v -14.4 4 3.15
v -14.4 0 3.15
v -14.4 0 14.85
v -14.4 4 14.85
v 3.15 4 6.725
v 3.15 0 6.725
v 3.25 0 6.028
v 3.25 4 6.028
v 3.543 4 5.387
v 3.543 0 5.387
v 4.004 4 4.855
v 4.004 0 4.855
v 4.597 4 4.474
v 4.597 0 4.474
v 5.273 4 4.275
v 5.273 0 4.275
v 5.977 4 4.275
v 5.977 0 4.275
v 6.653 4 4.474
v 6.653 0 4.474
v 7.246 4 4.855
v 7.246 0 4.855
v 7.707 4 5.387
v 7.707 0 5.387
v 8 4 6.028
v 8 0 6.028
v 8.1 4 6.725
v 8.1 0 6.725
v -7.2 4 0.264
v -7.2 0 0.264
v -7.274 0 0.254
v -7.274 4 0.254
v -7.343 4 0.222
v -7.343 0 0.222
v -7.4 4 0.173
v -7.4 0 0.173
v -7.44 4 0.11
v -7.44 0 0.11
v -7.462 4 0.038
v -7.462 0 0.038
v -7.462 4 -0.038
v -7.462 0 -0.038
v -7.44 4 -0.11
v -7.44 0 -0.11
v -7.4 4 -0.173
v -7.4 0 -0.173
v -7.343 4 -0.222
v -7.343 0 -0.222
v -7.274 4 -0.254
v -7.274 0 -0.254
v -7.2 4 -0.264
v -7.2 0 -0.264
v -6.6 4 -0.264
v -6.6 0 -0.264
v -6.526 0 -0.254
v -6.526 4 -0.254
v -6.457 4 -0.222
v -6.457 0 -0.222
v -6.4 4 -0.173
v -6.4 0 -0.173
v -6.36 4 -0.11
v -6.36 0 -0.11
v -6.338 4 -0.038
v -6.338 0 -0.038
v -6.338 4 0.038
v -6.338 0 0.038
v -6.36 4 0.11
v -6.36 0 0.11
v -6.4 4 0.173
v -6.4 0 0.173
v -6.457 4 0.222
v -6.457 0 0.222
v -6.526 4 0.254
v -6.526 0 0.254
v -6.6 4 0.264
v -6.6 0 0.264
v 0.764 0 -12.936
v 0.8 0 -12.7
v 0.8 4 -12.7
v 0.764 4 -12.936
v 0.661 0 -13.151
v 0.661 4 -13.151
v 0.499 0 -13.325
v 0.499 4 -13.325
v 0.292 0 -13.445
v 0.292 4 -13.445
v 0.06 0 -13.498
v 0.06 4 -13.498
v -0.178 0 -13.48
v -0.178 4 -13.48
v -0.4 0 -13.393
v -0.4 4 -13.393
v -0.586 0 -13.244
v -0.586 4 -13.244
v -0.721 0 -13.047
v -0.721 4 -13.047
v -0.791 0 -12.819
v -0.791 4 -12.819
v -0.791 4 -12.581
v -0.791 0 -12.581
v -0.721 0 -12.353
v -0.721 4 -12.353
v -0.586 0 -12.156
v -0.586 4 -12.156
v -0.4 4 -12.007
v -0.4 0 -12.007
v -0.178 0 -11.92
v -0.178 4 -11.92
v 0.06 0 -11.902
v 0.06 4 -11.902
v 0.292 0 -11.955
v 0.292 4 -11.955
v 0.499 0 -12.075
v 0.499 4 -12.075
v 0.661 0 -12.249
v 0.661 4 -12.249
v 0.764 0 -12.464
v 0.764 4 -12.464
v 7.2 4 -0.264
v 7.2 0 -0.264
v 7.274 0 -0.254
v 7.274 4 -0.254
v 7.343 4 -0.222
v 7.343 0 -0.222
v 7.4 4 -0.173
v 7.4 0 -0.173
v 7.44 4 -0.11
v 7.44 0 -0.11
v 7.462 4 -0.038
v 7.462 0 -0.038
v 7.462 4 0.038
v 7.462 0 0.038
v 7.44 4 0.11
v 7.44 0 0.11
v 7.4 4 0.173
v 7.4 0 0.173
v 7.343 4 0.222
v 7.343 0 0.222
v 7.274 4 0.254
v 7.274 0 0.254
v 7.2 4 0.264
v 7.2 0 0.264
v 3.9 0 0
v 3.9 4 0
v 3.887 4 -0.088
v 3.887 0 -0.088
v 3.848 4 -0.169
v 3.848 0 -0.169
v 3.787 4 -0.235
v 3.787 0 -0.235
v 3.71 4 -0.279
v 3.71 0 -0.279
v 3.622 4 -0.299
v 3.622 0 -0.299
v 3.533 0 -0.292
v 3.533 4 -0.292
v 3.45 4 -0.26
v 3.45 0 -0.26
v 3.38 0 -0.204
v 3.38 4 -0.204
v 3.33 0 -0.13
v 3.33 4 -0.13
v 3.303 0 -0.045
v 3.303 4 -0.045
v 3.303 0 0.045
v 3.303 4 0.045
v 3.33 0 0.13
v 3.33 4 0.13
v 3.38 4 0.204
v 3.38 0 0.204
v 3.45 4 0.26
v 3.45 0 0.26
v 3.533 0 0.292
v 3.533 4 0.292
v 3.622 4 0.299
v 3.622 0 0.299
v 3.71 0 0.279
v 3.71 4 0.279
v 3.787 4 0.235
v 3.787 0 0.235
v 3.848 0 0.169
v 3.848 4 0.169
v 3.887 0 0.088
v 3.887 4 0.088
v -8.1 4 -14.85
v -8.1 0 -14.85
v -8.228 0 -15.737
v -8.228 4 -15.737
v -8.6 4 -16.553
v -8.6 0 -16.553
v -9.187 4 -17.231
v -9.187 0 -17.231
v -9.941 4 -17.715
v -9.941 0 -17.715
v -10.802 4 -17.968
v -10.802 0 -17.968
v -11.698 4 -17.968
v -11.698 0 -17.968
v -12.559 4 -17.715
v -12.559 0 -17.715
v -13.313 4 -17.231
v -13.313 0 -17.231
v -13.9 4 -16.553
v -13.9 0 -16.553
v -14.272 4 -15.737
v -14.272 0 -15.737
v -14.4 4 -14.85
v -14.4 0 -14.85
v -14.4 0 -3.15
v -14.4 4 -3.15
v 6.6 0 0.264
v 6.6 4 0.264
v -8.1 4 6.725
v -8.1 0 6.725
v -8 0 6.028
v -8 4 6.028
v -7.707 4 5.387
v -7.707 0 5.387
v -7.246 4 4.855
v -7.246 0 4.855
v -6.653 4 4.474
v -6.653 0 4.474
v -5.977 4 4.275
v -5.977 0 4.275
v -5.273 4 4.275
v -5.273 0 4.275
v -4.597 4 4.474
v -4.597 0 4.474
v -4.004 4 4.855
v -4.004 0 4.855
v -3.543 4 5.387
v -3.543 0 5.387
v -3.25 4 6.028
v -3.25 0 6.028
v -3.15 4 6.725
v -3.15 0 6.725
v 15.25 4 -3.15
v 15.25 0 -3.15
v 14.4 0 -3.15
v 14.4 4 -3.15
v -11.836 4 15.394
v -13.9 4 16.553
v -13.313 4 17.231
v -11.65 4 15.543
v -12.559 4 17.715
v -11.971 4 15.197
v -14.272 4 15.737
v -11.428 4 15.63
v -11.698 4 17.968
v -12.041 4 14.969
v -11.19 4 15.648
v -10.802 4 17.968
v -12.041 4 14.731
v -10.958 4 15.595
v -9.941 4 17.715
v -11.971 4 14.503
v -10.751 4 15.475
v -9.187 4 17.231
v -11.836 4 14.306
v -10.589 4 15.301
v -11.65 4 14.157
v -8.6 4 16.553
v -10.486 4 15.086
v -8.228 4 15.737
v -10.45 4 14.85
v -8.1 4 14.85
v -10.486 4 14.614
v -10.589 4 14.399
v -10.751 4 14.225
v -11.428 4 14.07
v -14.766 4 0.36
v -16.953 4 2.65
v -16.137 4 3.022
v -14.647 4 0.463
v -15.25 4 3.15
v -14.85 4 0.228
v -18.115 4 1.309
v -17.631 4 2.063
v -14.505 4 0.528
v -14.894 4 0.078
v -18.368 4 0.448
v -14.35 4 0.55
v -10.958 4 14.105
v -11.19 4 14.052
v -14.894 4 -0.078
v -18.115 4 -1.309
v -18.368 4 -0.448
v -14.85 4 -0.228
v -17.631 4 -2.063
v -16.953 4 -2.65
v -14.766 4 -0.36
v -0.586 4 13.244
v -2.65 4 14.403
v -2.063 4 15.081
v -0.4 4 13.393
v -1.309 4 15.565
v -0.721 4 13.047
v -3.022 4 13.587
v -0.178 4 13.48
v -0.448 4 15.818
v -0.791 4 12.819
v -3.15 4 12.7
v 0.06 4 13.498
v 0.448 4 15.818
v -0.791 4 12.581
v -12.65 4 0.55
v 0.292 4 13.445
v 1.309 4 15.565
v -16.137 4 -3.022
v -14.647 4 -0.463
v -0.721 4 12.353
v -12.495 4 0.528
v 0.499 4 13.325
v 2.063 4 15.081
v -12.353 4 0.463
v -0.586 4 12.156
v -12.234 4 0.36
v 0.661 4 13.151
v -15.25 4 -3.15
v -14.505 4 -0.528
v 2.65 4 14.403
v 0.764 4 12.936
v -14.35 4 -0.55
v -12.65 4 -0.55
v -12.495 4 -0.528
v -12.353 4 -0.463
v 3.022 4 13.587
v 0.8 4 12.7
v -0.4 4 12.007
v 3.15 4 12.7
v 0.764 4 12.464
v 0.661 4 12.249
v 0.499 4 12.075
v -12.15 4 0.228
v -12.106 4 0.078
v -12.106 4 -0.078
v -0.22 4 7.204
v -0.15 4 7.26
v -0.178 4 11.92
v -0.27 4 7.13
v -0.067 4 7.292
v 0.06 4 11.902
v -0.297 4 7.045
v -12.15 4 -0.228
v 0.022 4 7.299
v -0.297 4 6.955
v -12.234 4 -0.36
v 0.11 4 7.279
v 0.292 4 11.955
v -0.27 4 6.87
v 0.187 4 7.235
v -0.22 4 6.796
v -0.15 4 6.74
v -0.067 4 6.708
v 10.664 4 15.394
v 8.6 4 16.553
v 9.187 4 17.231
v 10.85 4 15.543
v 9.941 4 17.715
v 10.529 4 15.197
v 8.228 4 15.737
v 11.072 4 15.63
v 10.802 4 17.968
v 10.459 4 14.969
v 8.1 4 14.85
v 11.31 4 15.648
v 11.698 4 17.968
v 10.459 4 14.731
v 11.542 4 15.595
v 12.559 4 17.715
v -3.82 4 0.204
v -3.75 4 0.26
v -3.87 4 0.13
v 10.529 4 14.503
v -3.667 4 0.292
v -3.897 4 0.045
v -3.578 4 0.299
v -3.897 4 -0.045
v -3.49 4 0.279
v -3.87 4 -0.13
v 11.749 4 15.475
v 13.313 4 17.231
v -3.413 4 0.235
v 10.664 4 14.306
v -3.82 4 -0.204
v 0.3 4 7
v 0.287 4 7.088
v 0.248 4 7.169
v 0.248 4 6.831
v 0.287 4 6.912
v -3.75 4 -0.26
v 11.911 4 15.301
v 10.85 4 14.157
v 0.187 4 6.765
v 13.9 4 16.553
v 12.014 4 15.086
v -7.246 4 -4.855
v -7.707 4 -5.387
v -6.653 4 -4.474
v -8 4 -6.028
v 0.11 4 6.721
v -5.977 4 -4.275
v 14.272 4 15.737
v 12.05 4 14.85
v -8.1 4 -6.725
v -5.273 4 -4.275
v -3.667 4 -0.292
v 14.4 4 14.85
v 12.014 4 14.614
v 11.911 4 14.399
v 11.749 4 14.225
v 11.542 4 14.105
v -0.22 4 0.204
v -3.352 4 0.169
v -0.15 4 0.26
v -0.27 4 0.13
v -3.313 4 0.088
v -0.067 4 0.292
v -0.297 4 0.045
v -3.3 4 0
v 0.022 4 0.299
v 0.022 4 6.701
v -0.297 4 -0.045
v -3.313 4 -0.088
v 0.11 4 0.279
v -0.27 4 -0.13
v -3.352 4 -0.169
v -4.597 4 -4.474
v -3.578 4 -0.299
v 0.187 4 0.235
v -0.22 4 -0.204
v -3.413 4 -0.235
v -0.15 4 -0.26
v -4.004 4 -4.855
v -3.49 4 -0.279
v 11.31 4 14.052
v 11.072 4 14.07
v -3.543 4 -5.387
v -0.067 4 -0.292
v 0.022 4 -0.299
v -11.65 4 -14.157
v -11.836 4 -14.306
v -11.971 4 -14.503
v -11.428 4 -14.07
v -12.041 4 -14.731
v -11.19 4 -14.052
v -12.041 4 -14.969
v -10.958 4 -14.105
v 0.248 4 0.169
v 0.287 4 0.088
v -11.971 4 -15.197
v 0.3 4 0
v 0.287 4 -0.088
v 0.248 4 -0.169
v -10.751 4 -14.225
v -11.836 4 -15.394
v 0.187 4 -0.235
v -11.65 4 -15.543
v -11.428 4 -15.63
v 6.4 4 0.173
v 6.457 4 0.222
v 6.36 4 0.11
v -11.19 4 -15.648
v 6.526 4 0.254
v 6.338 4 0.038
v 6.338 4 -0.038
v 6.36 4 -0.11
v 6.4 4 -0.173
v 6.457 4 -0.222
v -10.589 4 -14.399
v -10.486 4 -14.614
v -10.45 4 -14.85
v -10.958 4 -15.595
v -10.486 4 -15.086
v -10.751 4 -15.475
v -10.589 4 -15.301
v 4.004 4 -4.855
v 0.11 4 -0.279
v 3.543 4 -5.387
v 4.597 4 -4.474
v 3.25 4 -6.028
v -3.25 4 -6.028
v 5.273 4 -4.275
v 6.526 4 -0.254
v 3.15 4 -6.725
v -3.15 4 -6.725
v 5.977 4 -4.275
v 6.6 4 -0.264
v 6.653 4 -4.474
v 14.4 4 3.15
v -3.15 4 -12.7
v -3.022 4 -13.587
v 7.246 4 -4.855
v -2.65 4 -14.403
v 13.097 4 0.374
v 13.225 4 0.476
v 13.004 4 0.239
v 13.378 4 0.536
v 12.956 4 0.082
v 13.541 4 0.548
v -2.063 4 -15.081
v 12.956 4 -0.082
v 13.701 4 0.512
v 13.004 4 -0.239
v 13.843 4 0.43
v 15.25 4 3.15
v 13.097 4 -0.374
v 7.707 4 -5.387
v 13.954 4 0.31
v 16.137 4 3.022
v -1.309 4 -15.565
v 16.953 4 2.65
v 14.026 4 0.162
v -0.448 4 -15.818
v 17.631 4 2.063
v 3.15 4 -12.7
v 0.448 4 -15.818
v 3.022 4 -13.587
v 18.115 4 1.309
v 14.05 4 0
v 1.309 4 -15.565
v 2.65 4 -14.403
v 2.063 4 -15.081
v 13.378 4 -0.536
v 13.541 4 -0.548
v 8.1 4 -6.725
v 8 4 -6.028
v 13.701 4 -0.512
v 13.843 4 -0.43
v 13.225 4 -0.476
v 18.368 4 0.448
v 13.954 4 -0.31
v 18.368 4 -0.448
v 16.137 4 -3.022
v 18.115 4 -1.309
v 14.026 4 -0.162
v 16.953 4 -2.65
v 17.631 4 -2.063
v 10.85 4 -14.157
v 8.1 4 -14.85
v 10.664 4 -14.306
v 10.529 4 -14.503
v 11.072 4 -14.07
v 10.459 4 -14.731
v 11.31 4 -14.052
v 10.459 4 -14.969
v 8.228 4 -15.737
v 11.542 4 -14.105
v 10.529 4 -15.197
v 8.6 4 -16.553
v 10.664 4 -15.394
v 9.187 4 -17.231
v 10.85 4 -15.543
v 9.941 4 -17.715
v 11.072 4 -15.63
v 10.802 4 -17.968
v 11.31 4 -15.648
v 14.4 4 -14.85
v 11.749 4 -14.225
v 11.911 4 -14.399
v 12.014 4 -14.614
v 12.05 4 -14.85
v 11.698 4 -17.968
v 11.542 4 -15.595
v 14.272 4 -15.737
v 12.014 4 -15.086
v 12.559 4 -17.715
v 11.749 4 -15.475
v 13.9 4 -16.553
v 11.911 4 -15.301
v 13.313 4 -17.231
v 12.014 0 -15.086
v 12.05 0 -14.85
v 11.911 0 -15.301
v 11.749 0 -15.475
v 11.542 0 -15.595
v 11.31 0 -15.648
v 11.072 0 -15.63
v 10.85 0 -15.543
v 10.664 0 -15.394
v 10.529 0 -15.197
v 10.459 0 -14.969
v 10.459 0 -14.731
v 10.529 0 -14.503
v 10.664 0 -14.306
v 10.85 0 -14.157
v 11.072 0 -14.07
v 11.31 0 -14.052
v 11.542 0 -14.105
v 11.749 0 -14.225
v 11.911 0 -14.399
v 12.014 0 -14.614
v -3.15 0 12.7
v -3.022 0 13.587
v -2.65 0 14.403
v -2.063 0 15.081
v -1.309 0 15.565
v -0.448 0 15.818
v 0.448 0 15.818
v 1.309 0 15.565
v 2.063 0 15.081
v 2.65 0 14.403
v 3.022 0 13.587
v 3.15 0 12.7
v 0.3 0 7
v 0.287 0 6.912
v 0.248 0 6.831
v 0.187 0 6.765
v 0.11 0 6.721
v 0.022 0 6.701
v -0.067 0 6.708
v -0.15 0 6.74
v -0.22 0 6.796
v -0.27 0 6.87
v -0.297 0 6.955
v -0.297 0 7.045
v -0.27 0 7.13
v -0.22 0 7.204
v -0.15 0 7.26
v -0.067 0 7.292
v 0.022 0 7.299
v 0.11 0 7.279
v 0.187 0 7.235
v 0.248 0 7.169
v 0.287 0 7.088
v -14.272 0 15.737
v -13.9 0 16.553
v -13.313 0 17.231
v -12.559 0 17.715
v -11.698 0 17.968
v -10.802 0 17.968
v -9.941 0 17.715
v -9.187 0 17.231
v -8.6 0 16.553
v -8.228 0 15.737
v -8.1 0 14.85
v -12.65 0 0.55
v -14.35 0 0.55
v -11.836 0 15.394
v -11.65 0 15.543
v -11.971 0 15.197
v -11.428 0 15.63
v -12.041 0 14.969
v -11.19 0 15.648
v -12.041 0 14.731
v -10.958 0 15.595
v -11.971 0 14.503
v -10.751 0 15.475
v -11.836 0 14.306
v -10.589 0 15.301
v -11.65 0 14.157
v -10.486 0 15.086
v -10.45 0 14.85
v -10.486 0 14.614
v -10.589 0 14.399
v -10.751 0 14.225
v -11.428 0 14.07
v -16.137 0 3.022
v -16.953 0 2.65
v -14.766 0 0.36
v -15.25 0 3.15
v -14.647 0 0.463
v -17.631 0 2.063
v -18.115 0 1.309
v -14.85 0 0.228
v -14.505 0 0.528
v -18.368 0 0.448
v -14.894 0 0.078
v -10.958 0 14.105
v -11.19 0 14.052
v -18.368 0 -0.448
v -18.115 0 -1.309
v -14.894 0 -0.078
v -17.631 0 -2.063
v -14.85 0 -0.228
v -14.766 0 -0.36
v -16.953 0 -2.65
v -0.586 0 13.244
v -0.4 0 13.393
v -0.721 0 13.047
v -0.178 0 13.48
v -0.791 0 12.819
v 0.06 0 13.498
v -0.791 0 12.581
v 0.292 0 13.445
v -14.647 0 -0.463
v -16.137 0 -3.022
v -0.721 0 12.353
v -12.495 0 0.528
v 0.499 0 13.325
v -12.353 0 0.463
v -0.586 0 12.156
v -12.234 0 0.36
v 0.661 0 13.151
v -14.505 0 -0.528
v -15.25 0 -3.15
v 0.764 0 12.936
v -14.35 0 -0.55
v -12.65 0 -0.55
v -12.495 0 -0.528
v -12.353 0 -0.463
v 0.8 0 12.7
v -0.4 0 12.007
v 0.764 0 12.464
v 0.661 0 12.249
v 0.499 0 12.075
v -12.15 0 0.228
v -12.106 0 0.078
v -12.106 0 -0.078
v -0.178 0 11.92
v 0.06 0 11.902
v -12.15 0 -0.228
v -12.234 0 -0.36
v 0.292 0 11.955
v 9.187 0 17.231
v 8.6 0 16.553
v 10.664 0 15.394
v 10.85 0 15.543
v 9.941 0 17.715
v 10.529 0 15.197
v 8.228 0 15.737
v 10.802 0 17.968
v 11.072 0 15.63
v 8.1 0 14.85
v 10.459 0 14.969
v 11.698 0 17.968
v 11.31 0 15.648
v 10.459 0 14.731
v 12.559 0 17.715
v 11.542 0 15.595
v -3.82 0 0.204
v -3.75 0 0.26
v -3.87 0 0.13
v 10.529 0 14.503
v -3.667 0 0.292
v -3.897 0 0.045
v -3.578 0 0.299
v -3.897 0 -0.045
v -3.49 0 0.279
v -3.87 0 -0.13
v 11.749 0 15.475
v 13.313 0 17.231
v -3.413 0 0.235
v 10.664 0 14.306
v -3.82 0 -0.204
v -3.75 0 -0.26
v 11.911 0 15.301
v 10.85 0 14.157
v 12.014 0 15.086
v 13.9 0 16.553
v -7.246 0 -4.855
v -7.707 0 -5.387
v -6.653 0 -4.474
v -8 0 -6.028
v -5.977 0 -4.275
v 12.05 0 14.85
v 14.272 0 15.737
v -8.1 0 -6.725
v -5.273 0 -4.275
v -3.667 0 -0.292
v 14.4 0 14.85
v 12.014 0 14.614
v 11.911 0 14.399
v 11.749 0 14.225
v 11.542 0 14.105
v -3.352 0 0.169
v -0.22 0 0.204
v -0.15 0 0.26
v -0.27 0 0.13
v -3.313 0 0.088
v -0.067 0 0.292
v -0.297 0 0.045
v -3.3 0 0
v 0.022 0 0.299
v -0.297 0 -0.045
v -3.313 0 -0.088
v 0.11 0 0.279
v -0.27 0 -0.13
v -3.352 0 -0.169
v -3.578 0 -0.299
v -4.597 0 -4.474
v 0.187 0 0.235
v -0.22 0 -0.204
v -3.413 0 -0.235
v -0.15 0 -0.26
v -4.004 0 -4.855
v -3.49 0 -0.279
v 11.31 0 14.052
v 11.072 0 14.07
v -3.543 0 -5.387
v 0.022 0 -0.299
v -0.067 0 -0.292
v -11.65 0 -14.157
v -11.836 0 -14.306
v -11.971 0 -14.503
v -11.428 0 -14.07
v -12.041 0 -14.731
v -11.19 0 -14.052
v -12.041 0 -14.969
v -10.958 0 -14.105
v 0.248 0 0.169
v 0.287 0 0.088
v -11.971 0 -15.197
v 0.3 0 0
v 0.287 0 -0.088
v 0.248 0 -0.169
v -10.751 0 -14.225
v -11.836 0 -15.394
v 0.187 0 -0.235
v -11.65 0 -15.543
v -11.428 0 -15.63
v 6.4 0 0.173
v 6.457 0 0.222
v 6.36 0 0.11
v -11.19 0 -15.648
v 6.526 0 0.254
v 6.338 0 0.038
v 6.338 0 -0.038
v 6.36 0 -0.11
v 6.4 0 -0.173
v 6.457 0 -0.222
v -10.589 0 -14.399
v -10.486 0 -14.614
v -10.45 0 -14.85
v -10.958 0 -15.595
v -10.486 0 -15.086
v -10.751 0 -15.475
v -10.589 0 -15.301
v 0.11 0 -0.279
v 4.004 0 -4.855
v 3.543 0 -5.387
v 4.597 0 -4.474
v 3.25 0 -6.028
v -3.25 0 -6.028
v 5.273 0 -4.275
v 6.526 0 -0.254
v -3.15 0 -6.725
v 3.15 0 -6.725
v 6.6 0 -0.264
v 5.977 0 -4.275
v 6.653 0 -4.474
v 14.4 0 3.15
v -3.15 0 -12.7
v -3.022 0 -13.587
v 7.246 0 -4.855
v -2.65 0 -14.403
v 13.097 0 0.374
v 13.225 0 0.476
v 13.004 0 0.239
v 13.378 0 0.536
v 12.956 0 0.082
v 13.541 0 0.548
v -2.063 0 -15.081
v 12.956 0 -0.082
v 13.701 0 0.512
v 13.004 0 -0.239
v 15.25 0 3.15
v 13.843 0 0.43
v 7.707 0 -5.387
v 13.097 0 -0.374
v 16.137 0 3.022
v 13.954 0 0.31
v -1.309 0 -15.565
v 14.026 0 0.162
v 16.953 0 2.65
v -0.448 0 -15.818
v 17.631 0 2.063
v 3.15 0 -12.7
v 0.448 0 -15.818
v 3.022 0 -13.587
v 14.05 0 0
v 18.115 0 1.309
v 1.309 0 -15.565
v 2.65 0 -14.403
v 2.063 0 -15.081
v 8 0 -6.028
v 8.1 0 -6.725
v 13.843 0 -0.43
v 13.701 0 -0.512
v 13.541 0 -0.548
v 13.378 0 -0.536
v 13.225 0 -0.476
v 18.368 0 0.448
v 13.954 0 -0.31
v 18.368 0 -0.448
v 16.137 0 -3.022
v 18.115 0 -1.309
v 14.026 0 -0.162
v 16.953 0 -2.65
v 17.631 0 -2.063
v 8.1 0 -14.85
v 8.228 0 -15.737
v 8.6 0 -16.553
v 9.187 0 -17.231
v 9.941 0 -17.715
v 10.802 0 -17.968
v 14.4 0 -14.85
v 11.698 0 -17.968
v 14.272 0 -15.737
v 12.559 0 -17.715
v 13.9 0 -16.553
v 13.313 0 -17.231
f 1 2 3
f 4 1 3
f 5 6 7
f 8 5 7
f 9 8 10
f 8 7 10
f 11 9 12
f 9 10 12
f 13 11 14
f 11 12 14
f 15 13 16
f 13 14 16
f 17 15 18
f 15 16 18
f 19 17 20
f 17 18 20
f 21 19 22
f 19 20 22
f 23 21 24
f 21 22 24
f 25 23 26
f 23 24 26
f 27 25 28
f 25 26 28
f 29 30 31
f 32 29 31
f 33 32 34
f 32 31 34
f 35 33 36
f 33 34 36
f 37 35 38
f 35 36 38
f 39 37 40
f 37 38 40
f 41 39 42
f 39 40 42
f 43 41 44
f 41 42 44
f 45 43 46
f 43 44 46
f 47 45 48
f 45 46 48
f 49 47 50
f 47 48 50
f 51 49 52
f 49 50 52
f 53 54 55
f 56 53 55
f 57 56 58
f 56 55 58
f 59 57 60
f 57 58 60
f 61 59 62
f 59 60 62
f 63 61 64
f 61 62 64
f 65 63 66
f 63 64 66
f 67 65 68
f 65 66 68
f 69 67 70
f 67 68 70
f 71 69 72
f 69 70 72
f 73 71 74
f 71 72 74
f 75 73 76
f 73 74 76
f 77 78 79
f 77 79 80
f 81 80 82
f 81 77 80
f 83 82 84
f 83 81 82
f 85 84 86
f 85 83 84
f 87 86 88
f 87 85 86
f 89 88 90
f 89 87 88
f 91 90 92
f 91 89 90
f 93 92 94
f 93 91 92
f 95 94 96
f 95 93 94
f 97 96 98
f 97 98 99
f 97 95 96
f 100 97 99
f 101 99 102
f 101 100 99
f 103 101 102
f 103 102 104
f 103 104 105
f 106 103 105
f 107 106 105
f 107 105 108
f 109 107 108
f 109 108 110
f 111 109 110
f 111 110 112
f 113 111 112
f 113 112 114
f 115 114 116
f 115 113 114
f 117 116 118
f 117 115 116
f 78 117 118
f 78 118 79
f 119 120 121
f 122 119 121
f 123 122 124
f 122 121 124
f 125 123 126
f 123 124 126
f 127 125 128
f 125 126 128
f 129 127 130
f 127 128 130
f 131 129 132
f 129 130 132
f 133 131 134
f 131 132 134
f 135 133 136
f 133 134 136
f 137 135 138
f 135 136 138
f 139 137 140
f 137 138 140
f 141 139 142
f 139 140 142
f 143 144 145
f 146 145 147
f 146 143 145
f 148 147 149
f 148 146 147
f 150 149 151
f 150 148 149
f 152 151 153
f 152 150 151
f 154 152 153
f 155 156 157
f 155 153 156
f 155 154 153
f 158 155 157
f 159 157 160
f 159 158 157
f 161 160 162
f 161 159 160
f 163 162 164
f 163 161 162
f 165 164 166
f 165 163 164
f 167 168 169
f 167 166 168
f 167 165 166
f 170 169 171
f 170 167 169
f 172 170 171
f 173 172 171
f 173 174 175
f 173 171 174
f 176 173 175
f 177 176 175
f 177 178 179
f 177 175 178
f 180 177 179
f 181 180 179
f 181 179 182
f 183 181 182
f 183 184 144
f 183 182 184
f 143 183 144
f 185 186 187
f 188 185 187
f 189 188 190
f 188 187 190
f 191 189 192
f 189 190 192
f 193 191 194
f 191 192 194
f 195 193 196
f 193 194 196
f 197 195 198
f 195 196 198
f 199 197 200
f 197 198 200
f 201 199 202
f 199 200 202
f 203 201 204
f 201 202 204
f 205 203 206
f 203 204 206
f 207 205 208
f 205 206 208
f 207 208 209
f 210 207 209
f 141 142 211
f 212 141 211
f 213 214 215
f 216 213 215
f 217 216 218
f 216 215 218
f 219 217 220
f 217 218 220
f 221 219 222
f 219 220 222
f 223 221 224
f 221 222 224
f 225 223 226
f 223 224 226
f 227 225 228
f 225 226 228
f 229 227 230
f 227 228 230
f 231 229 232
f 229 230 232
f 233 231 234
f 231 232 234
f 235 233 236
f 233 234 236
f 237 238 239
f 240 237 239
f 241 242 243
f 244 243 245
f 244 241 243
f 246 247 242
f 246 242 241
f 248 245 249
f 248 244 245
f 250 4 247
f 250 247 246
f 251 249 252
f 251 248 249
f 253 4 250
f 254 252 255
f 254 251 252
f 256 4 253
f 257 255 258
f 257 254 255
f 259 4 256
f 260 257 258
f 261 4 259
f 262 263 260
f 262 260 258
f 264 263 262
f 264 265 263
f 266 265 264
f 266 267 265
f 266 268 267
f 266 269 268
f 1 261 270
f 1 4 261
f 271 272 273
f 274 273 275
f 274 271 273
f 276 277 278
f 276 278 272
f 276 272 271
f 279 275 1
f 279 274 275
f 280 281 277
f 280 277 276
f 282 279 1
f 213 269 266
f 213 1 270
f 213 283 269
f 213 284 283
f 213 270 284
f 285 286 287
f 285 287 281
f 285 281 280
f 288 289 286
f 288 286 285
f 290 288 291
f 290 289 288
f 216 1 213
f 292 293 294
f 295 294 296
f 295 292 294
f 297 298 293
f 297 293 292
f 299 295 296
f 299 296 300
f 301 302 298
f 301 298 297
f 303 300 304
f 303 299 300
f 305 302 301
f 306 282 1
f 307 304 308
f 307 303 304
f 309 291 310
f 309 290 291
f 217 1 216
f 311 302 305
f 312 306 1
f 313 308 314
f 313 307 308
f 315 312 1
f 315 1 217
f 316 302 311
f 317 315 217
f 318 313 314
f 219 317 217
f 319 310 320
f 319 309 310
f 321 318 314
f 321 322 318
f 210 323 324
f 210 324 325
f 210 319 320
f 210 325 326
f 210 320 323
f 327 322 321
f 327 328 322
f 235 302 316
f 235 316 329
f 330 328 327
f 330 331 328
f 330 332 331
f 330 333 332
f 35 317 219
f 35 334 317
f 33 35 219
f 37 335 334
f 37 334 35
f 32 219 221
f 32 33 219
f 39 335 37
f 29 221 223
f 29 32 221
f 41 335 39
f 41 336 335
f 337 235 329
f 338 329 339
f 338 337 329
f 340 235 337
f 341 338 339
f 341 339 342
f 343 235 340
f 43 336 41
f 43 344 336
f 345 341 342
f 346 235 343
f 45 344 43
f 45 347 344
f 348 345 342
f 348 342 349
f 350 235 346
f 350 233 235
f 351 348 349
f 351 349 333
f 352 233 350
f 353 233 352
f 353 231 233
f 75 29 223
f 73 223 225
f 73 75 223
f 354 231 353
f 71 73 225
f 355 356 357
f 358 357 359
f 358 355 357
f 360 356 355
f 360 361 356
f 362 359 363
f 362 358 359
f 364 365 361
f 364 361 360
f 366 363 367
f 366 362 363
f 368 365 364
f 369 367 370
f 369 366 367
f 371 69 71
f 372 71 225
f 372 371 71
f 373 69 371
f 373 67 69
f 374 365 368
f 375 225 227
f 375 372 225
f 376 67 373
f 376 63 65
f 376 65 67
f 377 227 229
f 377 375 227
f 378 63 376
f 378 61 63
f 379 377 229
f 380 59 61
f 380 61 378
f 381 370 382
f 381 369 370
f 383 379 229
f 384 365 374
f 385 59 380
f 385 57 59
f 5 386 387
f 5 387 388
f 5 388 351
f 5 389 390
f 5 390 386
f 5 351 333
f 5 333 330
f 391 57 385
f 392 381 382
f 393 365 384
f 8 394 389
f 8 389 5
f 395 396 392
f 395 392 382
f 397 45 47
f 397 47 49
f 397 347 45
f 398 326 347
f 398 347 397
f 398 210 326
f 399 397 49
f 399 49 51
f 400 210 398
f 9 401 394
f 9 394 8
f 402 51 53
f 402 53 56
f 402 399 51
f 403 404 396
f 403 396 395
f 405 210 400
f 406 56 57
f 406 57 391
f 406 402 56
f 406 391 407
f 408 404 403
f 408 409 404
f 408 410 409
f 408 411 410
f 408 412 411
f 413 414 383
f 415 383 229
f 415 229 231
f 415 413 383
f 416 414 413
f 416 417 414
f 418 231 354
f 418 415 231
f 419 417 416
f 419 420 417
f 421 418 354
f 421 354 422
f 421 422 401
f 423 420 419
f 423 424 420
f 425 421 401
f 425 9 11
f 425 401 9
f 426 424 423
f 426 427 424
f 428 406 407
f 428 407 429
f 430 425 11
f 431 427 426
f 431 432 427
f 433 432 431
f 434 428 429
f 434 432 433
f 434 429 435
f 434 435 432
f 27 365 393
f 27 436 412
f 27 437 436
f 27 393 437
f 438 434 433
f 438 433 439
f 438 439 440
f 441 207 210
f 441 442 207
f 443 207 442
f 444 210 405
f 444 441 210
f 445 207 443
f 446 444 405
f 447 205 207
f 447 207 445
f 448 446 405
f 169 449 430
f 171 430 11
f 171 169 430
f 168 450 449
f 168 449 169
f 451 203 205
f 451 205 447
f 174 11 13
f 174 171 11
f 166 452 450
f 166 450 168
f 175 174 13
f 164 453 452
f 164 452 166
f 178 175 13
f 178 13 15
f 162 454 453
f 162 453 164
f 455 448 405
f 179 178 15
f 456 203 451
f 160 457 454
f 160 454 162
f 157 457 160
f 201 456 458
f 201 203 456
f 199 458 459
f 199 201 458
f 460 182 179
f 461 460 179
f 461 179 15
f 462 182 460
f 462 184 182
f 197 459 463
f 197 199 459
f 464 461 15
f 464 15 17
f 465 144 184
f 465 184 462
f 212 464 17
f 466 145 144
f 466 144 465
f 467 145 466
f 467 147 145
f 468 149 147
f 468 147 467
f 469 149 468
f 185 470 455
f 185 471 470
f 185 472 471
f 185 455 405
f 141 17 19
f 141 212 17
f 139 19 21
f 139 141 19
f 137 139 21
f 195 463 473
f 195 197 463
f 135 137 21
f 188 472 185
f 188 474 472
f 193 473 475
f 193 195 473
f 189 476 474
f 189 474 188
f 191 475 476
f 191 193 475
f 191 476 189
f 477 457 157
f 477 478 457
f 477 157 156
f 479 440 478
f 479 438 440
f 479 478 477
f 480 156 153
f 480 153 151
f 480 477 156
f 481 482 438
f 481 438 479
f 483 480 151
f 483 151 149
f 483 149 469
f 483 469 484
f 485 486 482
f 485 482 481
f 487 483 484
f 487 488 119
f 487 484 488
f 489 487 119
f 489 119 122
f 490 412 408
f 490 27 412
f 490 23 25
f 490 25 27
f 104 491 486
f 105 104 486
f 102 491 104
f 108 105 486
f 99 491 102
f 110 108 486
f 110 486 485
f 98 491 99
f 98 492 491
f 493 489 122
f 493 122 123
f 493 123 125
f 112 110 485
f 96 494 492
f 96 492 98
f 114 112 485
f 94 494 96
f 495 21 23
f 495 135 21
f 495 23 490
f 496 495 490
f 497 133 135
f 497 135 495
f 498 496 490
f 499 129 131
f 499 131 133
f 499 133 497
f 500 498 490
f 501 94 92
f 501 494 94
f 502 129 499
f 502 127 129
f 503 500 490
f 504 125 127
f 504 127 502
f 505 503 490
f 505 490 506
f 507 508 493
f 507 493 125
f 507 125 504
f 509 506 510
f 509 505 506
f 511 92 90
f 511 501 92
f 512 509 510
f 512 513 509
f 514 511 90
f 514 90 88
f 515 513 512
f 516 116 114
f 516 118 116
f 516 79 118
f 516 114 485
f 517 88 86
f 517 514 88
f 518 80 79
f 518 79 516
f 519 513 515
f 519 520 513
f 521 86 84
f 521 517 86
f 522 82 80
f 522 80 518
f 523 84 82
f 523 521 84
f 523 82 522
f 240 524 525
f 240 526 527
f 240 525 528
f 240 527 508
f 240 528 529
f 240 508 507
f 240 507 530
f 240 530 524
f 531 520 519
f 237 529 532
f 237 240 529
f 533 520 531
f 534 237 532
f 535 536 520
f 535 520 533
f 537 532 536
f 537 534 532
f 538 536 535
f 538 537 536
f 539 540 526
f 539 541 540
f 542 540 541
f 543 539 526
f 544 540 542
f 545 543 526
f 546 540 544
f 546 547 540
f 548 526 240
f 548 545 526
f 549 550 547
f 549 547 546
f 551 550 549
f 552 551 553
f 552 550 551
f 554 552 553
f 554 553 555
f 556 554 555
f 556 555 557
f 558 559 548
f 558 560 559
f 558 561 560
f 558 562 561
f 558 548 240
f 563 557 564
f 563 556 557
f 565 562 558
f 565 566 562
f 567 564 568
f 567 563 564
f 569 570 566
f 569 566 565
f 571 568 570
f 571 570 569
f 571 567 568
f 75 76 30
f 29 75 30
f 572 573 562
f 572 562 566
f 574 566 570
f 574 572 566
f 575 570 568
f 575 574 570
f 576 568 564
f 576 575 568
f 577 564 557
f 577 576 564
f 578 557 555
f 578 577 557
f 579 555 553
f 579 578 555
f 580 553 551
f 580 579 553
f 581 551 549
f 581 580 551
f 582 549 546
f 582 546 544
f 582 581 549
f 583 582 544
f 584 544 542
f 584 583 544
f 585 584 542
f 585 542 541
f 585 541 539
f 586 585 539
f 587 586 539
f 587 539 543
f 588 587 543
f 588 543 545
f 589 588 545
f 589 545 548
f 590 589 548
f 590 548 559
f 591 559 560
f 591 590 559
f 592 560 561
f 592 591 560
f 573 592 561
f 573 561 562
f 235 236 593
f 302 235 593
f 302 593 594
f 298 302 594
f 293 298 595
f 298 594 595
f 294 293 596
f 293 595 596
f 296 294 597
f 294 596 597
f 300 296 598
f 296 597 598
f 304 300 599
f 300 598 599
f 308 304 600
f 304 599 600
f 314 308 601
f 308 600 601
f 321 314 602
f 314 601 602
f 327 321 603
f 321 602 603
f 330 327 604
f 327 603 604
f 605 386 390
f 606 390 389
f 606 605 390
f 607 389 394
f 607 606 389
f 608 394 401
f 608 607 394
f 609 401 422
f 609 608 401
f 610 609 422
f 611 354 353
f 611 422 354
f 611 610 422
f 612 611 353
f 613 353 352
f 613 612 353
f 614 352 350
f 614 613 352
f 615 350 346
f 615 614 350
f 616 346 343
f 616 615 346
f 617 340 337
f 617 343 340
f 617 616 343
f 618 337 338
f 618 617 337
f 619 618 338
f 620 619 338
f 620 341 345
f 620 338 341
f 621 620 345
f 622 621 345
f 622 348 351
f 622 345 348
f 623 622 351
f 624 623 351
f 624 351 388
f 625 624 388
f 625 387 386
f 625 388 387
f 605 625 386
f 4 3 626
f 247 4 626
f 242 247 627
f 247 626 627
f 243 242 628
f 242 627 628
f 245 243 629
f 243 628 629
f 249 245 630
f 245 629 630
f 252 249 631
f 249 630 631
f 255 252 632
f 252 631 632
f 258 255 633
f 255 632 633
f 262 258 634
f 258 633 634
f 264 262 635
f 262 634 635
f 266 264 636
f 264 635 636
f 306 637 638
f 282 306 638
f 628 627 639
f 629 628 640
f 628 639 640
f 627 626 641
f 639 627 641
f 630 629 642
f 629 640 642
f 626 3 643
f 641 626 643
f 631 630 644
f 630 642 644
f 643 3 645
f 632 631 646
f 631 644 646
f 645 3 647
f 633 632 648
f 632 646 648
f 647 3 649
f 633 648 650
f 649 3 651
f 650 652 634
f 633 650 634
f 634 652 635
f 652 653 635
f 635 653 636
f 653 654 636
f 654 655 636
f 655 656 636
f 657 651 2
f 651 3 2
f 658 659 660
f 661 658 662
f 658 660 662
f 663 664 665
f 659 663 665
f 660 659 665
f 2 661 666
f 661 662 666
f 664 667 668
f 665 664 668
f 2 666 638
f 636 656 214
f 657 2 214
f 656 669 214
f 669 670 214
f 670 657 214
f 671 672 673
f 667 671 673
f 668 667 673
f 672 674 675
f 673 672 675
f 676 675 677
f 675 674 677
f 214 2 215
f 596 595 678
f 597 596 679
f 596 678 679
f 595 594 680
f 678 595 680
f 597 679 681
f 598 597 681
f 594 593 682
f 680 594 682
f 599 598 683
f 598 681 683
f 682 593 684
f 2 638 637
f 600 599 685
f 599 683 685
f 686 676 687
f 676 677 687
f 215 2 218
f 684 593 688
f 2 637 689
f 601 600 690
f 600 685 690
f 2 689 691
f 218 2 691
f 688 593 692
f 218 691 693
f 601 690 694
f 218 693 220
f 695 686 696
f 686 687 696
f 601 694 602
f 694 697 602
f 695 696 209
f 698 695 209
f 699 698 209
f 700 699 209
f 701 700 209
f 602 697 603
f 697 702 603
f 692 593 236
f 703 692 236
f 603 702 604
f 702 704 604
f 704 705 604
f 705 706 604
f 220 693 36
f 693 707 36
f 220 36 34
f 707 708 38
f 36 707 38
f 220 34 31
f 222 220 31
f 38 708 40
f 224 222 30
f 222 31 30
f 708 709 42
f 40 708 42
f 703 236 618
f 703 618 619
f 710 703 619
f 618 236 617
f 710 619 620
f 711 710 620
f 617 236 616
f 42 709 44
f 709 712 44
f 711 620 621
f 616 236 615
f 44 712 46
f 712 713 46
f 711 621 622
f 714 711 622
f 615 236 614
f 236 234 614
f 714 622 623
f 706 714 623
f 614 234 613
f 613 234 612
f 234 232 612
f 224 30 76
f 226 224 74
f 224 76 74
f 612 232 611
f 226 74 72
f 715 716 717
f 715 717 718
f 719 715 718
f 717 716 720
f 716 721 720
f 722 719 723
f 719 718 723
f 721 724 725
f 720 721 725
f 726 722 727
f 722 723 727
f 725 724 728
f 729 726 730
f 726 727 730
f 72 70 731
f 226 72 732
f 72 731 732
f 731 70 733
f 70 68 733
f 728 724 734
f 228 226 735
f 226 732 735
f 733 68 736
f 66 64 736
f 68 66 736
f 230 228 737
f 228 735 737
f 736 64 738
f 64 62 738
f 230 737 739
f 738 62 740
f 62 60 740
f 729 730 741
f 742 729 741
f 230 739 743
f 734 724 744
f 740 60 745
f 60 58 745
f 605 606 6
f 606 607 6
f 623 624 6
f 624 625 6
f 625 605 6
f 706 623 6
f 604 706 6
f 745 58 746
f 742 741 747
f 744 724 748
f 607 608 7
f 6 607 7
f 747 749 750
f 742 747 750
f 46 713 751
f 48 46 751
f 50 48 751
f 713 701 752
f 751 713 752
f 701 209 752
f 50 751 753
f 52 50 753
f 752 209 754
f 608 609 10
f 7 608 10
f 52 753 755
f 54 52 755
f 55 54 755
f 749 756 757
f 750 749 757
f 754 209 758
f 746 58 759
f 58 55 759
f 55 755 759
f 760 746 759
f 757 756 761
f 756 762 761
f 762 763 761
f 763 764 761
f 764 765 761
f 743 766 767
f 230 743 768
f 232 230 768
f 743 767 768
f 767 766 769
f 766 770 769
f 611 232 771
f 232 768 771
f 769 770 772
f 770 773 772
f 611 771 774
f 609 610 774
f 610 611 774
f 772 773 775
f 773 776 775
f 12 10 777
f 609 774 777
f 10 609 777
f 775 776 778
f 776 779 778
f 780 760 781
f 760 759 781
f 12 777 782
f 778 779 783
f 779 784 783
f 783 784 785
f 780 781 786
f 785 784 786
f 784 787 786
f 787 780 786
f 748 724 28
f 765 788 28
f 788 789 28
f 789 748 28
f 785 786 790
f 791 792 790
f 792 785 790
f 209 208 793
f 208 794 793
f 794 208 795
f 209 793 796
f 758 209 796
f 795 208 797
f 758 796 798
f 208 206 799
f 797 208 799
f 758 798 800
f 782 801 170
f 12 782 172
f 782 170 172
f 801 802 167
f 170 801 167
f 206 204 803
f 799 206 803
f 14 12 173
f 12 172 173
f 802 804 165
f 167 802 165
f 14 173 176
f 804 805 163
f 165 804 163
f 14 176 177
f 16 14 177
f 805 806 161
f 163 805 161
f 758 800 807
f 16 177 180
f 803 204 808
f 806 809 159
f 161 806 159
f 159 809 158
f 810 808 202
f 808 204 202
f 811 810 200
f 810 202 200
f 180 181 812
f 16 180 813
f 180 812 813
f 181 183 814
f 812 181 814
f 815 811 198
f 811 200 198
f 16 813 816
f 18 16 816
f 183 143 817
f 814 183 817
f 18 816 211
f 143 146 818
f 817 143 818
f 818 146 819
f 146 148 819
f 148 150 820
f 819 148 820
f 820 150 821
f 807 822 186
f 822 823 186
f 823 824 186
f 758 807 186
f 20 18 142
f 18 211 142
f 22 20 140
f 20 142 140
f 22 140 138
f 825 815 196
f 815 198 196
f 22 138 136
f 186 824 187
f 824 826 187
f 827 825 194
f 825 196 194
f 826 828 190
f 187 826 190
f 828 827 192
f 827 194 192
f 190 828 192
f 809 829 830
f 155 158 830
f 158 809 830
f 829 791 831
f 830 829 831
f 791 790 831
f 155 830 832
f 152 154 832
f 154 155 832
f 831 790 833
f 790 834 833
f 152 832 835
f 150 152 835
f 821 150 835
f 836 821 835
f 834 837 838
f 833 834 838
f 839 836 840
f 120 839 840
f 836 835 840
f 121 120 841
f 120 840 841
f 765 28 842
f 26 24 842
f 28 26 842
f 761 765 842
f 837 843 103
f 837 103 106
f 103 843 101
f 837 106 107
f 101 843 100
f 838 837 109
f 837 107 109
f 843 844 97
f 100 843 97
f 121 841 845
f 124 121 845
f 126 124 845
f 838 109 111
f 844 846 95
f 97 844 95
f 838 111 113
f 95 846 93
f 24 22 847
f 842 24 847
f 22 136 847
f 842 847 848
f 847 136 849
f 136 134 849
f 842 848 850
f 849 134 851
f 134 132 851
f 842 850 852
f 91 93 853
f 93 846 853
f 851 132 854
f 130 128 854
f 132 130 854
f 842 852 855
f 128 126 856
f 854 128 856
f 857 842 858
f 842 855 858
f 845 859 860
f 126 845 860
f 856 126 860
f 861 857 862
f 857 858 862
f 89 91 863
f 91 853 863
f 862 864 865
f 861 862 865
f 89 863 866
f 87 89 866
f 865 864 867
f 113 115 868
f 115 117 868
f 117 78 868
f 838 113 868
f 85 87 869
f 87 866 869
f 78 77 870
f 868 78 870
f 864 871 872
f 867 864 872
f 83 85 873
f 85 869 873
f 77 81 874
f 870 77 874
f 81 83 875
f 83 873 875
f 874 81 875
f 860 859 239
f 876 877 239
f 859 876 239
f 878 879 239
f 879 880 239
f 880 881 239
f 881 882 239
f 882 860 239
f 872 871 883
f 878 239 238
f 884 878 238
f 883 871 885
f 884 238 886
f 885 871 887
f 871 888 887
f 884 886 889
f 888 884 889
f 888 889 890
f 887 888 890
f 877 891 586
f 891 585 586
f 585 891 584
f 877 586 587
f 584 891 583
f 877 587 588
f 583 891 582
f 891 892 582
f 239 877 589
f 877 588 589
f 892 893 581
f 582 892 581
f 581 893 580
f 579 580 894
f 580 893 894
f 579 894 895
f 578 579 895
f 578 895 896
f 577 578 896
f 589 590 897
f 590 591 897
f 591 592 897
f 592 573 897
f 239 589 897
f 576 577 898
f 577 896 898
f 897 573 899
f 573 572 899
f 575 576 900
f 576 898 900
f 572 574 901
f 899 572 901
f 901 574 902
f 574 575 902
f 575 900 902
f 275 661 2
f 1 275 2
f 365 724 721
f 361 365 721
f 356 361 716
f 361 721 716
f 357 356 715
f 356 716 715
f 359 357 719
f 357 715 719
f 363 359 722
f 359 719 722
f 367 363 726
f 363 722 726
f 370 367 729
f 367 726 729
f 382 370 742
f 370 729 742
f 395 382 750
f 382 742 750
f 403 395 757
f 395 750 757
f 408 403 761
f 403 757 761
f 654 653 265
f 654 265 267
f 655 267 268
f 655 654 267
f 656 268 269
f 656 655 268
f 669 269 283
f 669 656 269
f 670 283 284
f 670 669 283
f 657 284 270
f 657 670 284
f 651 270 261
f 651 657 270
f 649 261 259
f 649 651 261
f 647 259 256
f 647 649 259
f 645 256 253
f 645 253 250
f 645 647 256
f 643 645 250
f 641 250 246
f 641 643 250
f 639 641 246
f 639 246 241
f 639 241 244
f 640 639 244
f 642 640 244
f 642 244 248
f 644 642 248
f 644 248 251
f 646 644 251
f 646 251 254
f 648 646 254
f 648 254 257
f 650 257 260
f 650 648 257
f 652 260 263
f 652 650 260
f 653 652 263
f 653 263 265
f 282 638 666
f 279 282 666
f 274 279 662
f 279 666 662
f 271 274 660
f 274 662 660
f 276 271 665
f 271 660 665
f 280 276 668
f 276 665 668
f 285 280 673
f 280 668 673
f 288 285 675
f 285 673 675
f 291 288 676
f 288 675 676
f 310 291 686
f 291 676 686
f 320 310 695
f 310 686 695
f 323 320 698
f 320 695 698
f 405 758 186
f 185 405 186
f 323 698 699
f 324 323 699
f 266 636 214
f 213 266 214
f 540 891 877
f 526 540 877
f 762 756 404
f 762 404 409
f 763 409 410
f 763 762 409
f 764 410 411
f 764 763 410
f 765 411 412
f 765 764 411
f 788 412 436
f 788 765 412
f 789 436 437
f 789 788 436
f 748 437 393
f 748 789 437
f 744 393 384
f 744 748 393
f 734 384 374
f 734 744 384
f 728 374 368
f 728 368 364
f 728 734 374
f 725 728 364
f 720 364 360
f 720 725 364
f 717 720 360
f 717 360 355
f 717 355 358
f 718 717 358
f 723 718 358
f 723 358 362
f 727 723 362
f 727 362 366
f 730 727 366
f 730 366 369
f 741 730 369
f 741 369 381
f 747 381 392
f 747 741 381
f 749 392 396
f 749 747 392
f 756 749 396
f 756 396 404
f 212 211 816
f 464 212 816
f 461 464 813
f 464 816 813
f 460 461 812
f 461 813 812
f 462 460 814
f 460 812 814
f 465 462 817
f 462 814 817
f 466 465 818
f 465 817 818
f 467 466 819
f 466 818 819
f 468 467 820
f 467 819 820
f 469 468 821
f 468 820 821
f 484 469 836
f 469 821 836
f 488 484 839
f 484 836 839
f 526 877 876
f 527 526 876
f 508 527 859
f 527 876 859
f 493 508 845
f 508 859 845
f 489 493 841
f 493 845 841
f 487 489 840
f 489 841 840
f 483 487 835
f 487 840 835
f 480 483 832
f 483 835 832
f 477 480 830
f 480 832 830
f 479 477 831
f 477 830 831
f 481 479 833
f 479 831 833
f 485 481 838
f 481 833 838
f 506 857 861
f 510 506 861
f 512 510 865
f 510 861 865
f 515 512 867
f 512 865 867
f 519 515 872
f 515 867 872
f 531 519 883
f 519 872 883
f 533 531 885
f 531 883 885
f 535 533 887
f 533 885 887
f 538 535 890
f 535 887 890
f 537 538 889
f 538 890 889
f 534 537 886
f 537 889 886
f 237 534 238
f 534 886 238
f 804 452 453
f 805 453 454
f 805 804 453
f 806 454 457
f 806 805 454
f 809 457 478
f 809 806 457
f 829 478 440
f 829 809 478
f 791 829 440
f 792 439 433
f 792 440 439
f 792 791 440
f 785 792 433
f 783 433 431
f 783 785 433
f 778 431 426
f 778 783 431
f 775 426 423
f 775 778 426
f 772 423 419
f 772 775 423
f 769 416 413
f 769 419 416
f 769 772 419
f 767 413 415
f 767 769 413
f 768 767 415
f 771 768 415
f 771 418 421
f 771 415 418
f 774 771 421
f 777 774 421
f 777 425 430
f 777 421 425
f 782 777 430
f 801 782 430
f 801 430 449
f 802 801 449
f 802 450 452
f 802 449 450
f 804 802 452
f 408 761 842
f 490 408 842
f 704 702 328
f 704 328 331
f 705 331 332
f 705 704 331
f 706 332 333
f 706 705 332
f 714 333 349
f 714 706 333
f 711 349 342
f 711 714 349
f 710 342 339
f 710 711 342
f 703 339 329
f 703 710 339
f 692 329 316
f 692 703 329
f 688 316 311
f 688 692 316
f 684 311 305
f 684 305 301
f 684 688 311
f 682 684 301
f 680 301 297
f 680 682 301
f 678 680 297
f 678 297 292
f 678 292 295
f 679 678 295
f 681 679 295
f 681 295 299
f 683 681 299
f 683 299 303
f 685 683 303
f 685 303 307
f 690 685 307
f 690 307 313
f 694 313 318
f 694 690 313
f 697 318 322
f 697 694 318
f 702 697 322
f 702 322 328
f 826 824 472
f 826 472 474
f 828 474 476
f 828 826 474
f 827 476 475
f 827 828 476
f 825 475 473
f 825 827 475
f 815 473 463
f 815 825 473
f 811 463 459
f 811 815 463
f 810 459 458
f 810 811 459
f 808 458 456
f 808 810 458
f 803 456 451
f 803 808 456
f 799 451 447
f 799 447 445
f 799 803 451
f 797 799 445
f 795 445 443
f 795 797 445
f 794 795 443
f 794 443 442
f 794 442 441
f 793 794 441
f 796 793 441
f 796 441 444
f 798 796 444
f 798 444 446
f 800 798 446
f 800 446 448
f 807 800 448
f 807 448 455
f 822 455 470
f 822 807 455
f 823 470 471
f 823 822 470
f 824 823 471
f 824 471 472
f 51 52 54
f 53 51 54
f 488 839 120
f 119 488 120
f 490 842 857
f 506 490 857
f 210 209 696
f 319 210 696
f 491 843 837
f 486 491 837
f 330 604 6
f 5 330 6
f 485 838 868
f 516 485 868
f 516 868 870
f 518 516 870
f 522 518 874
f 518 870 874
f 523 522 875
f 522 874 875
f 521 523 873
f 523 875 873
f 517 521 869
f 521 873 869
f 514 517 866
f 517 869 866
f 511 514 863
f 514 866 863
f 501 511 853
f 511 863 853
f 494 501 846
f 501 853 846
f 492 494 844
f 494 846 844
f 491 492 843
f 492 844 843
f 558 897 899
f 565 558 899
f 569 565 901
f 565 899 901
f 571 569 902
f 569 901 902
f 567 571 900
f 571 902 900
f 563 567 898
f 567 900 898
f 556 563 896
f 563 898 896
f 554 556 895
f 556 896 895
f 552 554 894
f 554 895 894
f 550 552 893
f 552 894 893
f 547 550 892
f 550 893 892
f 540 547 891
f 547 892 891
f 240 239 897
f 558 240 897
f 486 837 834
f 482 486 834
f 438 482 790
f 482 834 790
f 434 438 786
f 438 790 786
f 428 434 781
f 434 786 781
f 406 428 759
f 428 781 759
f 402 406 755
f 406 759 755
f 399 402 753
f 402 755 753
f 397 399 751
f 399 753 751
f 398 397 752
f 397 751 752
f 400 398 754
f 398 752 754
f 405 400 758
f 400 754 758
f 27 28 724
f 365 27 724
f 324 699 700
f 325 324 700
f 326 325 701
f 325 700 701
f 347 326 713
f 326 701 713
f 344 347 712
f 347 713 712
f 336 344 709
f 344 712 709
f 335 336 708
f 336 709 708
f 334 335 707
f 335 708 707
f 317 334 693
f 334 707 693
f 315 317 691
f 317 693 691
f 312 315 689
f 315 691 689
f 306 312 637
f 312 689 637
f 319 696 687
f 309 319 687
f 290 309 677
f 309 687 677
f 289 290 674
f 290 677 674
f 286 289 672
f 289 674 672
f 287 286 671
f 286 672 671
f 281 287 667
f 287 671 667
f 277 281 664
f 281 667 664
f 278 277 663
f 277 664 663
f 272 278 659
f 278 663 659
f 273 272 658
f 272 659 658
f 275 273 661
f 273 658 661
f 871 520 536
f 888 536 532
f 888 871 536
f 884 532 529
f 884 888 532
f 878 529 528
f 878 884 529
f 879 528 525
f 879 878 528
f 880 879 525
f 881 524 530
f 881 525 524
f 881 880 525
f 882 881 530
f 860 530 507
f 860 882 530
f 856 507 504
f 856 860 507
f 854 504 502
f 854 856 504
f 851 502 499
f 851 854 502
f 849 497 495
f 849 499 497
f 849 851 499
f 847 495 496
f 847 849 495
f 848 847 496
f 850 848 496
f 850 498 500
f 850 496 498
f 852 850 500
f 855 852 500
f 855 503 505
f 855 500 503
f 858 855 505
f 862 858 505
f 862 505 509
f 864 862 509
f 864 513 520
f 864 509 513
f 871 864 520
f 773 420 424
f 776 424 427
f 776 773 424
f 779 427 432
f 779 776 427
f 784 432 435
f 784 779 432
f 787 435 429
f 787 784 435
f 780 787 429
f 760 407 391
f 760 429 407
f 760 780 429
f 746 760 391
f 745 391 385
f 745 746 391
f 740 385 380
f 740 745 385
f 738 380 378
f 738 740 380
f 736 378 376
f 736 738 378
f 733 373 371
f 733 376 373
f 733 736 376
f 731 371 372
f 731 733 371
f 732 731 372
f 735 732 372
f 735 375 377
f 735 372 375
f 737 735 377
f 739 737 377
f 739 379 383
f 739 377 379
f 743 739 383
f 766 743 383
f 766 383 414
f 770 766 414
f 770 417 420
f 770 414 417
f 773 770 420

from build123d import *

# Parameters (mm, degrees)
SKETCH1_R       = 0.8
EXTRUDE9_DEPTH  = 4
SKETCH2_R       = 0.55
EXTRUDE10_DEPTH = 5
SKETCH3_R       = 0.3
EXTRUDE11_DEPTH = 10


with BuildPart() as part:
    # Sketch1 → Extrude9 (new body)
    with BuildSketch(Plane(origin=(0, 0, 0), x_dir=(1, 0, 0), z_dir=(0, 1, 0))):
        with BuildLine():
            Line((-14.4, 14.85), (-14.4, 3.15))
            Line((-14.4, 3.15), (-15.25, 3.15))
            ThreePointArc((-15.25, 3.15), (-18.4, 0), (-15.25, -3.15))
            Line((-15.25, -3.15), (-14.4, -3.15))
            Line((-14.4, -3.15), (-14.4, -14.85))
            ThreePointArc((-14.4, -14.85), (-11.25, -18), (-8.1, -14.85))
            Line((-8.1, -14.85), (-8.1, -6.725))
            ThreePointArc((-8.1, -6.725), (-5.625, -4.25), (-3.15, -6.725))
            Line((-3.15, -6.725), (-3.15, -12.7))
            ThreePointArc((-3.15, -12.7), (0, -15.85), (3.15, -12.7))
            Line((3.15, -12.7), (3.15, -6.725))
            ThreePointArc((3.15, -6.725), (5.625, -4.25), (8.1, -6.725))
            Line((8.1, -6.725), (8.1, -14.85))
            ThreePointArc((8.1, -14.85), (11.25, -18), (14.4, -14.85))
            Line((14.4, -14.85), (14.4, -3.15))
            Line((14.4, -3.15), (15.25, -3.15))
            ThreePointArc((15.25, -3.15), (18.4, 0), (15.25, 3.15))
            Line((15.25, 3.15), (14.4, 3.15))
            Line((14.4, 3.15), (14.4, 14.85))
            ThreePointArc((14.4, 14.85), (11.25, 18), (8.1, 14.85))
            Line((8.1, 14.85), (8.1, 6.725))
            ThreePointArc((8.1, 6.725), (5.625, 4.25), (3.15, 6.725))
            Line((3.15, 6.725), (3.15, 12.7))
            ThreePointArc((3.15, 12.7), (0, 15.85), (-3.15, 12.7))
            Line((-3.15, 12.7), (-3.15, 6.725))
            ThreePointArc((-3.15, 6.725), (-5.625, 4.25), (-8.1, 6.725))
            Line((-8.1, 6.725), (-8.1, 14.85))
            ThreePointArc((-8.1, 14.85), (-11.25, 18), (-14.4, 14.85))
        make_face()
        with Locations((-11.25, 14.85)):
            Circle(SKETCH1_R, mode=Mode.SUBTRACT)
        with Locations((0, 12.7)):
            Circle(SKETCH1_R, mode=Mode.SUBTRACT)
        with Locations((11.25, 14.85)):
            Circle(SKETCH1_R, mode=Mode.SUBTRACT)
        with Locations((11.25, -14.85)):
            Circle(SKETCH1_R, mode=Mode.SUBTRACT)
        with Locations((0, -12.7)):
            Circle(SKETCH1_R, mode=Mode.SUBTRACT)
        with Locations((-11.25, -14.85)):
            Circle(SKETCH1_R, mode=Mode.SUBTRACT)
    extrude(amount=EXTRUDE9_DEPTH)

    # Sketch2 → Extrude10 (cut, through all)
    with BuildSketch(Plane(origin=(0, 0, 0), x_dir=(1, 0, 0), z_dir=(0, 1, 0))):
        with Locations((13.5, 0)):
            Circle(SKETCH2_R)
        with BuildLine():
            Line((-14.35, 0.55), (-12.65, 0.55))
            ThreePointArc((-12.65, 0.55), (-12.1, 0), (-12.65, -0.55))
            Line((-12.65, -0.55), (-14.35, -0.55))
            ThreePointArc((-14.35, -0.55), (-14.9, 0), (-14.35, 0.55))
        make_face()
    extrude(amount=EXTRUDE10_DEPTH, mode=Mode.SUBTRACT)

    # Sketch3 → Extrude11 (cut)
    with BuildSketch(Plane(origin=(0, 0, 0), x_dir=(1, 0, 0), z_dir=(0, 1, 0))):
        with Locations((-3.6, 0)):
            Circle(SKETCH3_R)
        with Locations((3.6, 0)):
            Circle(SKETCH3_R)
        Circle(SKETCH3_R)
        with Locations((0, -7)):
            Circle(SKETCH3_R)
        with BuildLine():
            Line((-7.2, 0.264383356), (-6.6, 0.264383356))
            ThreePointArc((-6.6, 0.264383356), (-6.335616644, 0), (-6.6, -0.264383356))
            Line((-6.6, -0.264383356), (-7.2, -0.264383356))
            ThreePointArc((-7.2, -0.264383356), (-7.464383356, 0), (-7.2, 0.264383356))
        make_face()
        with BuildLine():
            Line((6.6, 0.264383356), (7.2, 0.264383356))
            ThreePointArc((7.2, 0.264383356), (7.464383356, 0), (7.2, -0.264383356))
            Line((7.2, -0.264383356), (6.6, -0.264383356))
            ThreePointArc((6.6, -0.264383356), (6.335616644, 0), (6.6, 0.264383356))
        make_face()
    extrude(amount=EXTRUDE11_DEPTH, mode=Mode.SUBTRACT)


solid = part.part
